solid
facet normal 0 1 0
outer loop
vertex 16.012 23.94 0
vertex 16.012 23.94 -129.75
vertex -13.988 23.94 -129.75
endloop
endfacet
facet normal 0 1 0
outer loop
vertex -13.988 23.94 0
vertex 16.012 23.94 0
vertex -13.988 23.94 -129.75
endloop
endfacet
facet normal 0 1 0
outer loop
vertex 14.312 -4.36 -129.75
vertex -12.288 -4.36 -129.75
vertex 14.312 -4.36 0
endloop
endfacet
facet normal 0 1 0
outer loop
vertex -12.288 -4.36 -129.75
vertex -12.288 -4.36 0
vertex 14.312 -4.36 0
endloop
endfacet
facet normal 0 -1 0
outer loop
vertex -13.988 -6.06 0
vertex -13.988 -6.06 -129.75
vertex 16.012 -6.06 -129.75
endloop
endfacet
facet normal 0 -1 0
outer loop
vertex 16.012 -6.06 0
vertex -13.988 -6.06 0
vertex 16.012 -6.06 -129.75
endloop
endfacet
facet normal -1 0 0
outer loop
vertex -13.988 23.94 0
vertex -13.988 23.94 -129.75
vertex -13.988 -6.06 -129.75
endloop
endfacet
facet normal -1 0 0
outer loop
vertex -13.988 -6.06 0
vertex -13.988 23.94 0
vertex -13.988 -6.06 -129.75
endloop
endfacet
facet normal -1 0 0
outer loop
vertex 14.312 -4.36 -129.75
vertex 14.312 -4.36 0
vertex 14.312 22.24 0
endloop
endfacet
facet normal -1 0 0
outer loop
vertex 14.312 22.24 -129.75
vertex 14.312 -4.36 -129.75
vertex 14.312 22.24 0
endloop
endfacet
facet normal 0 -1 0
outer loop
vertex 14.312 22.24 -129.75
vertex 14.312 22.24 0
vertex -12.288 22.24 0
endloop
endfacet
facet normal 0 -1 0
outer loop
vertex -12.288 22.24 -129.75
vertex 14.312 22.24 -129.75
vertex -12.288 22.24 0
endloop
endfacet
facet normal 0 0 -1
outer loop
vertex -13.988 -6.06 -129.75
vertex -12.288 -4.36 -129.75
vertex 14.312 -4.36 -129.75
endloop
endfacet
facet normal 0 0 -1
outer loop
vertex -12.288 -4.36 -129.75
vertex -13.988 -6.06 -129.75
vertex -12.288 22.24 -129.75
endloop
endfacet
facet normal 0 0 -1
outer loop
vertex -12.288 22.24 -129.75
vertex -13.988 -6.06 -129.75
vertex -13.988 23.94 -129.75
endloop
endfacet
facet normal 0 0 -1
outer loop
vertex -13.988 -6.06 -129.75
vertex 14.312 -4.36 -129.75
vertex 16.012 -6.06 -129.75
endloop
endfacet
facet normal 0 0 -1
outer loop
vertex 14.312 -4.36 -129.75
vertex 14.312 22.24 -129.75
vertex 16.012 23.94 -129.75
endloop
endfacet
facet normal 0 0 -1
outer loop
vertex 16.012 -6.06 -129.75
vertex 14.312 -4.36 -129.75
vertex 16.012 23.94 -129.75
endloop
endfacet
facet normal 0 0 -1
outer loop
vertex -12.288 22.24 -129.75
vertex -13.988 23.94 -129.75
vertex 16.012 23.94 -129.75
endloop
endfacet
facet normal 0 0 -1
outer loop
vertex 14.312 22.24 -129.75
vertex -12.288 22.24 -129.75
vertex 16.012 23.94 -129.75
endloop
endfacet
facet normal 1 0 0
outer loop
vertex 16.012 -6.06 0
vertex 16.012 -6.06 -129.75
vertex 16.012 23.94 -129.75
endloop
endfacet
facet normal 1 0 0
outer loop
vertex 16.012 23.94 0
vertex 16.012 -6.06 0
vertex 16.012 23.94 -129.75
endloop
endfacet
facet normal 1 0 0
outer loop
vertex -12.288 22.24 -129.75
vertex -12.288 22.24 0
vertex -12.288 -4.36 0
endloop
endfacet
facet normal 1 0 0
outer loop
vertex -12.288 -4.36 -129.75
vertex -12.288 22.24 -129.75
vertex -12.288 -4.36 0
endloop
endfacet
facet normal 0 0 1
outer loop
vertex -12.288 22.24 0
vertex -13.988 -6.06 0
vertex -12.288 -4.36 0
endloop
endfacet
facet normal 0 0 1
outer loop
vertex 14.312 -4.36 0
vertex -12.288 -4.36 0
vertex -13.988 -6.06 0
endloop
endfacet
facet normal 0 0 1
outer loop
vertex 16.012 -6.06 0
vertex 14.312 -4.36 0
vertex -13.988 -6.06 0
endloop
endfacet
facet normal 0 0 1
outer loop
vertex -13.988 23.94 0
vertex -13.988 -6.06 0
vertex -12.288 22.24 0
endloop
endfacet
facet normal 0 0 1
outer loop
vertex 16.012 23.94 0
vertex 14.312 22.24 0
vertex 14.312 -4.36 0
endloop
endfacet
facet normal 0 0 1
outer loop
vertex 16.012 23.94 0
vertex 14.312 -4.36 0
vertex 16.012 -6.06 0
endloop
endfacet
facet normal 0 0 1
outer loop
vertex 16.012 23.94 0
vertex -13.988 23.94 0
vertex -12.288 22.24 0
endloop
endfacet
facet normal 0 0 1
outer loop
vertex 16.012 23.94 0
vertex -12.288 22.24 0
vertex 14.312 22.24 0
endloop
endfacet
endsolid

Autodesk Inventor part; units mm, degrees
ref_plane "YZ Plane" through (0, 0, 0) normal (1, 0, 0) x (0, 1, 0)
ref_plane "XZ Plane" through (0, 0, 0) normal (0, 1, 0) x (-1, 0, 0)
ref_plane "XY Plane" through (0, 0, 0) normal (0, 0, 1) x (1, 0, 0)
sketch "Sketch1" plane through (0, 0, 0) normal (0, 0, 1) x (1, 0, 0)
  line L0 (-13.9879, -6.06) -> (16.0121, -6.06)
  line L1 (16.0121, -6.06) -> (16.0121, 23.94)
  line L2 (16.0121, 23.94) -> (-13.9879, 23.94)
  line L3 (-13.9879, 23.94) -> (-13.9879, -6.06)
  line L4 (-12.2879, 23.94) -> (-12.2879, -6.06)
  line L5 (-13.9879, -4.36) -> (16.0121, -4.36)
  line L6 (14.3121, -6.06) -> (14.3121, 23.94)
  line L7 (16.0121, 22.24) -> (-13.9879, 22.24)
  point P0 (0, 0)
  point P1 (14.3121, 22.24)
  point P2 (-12.2879, 22.24)
  point P3 (-12.2879, -4.36)
  point P4 (14.3121, -4.36)
  dimension "d1" = 30
  dimension "d3" = 1.7
  dimension "d4" = 1.7
  dimension "d5" = 1.7
  dimension "d6" = 1.7
extrude "Extrusion1" add sketch "Sketch1" against normal blind 129.75
extrude "Extrusion2" cut sketch "Sketch1" against normal blind 403 contours L4 L7 L6 L5
properties part number "Cablecanal Ranurado 30 x 30 L = 403" material "PVC-Piping"
